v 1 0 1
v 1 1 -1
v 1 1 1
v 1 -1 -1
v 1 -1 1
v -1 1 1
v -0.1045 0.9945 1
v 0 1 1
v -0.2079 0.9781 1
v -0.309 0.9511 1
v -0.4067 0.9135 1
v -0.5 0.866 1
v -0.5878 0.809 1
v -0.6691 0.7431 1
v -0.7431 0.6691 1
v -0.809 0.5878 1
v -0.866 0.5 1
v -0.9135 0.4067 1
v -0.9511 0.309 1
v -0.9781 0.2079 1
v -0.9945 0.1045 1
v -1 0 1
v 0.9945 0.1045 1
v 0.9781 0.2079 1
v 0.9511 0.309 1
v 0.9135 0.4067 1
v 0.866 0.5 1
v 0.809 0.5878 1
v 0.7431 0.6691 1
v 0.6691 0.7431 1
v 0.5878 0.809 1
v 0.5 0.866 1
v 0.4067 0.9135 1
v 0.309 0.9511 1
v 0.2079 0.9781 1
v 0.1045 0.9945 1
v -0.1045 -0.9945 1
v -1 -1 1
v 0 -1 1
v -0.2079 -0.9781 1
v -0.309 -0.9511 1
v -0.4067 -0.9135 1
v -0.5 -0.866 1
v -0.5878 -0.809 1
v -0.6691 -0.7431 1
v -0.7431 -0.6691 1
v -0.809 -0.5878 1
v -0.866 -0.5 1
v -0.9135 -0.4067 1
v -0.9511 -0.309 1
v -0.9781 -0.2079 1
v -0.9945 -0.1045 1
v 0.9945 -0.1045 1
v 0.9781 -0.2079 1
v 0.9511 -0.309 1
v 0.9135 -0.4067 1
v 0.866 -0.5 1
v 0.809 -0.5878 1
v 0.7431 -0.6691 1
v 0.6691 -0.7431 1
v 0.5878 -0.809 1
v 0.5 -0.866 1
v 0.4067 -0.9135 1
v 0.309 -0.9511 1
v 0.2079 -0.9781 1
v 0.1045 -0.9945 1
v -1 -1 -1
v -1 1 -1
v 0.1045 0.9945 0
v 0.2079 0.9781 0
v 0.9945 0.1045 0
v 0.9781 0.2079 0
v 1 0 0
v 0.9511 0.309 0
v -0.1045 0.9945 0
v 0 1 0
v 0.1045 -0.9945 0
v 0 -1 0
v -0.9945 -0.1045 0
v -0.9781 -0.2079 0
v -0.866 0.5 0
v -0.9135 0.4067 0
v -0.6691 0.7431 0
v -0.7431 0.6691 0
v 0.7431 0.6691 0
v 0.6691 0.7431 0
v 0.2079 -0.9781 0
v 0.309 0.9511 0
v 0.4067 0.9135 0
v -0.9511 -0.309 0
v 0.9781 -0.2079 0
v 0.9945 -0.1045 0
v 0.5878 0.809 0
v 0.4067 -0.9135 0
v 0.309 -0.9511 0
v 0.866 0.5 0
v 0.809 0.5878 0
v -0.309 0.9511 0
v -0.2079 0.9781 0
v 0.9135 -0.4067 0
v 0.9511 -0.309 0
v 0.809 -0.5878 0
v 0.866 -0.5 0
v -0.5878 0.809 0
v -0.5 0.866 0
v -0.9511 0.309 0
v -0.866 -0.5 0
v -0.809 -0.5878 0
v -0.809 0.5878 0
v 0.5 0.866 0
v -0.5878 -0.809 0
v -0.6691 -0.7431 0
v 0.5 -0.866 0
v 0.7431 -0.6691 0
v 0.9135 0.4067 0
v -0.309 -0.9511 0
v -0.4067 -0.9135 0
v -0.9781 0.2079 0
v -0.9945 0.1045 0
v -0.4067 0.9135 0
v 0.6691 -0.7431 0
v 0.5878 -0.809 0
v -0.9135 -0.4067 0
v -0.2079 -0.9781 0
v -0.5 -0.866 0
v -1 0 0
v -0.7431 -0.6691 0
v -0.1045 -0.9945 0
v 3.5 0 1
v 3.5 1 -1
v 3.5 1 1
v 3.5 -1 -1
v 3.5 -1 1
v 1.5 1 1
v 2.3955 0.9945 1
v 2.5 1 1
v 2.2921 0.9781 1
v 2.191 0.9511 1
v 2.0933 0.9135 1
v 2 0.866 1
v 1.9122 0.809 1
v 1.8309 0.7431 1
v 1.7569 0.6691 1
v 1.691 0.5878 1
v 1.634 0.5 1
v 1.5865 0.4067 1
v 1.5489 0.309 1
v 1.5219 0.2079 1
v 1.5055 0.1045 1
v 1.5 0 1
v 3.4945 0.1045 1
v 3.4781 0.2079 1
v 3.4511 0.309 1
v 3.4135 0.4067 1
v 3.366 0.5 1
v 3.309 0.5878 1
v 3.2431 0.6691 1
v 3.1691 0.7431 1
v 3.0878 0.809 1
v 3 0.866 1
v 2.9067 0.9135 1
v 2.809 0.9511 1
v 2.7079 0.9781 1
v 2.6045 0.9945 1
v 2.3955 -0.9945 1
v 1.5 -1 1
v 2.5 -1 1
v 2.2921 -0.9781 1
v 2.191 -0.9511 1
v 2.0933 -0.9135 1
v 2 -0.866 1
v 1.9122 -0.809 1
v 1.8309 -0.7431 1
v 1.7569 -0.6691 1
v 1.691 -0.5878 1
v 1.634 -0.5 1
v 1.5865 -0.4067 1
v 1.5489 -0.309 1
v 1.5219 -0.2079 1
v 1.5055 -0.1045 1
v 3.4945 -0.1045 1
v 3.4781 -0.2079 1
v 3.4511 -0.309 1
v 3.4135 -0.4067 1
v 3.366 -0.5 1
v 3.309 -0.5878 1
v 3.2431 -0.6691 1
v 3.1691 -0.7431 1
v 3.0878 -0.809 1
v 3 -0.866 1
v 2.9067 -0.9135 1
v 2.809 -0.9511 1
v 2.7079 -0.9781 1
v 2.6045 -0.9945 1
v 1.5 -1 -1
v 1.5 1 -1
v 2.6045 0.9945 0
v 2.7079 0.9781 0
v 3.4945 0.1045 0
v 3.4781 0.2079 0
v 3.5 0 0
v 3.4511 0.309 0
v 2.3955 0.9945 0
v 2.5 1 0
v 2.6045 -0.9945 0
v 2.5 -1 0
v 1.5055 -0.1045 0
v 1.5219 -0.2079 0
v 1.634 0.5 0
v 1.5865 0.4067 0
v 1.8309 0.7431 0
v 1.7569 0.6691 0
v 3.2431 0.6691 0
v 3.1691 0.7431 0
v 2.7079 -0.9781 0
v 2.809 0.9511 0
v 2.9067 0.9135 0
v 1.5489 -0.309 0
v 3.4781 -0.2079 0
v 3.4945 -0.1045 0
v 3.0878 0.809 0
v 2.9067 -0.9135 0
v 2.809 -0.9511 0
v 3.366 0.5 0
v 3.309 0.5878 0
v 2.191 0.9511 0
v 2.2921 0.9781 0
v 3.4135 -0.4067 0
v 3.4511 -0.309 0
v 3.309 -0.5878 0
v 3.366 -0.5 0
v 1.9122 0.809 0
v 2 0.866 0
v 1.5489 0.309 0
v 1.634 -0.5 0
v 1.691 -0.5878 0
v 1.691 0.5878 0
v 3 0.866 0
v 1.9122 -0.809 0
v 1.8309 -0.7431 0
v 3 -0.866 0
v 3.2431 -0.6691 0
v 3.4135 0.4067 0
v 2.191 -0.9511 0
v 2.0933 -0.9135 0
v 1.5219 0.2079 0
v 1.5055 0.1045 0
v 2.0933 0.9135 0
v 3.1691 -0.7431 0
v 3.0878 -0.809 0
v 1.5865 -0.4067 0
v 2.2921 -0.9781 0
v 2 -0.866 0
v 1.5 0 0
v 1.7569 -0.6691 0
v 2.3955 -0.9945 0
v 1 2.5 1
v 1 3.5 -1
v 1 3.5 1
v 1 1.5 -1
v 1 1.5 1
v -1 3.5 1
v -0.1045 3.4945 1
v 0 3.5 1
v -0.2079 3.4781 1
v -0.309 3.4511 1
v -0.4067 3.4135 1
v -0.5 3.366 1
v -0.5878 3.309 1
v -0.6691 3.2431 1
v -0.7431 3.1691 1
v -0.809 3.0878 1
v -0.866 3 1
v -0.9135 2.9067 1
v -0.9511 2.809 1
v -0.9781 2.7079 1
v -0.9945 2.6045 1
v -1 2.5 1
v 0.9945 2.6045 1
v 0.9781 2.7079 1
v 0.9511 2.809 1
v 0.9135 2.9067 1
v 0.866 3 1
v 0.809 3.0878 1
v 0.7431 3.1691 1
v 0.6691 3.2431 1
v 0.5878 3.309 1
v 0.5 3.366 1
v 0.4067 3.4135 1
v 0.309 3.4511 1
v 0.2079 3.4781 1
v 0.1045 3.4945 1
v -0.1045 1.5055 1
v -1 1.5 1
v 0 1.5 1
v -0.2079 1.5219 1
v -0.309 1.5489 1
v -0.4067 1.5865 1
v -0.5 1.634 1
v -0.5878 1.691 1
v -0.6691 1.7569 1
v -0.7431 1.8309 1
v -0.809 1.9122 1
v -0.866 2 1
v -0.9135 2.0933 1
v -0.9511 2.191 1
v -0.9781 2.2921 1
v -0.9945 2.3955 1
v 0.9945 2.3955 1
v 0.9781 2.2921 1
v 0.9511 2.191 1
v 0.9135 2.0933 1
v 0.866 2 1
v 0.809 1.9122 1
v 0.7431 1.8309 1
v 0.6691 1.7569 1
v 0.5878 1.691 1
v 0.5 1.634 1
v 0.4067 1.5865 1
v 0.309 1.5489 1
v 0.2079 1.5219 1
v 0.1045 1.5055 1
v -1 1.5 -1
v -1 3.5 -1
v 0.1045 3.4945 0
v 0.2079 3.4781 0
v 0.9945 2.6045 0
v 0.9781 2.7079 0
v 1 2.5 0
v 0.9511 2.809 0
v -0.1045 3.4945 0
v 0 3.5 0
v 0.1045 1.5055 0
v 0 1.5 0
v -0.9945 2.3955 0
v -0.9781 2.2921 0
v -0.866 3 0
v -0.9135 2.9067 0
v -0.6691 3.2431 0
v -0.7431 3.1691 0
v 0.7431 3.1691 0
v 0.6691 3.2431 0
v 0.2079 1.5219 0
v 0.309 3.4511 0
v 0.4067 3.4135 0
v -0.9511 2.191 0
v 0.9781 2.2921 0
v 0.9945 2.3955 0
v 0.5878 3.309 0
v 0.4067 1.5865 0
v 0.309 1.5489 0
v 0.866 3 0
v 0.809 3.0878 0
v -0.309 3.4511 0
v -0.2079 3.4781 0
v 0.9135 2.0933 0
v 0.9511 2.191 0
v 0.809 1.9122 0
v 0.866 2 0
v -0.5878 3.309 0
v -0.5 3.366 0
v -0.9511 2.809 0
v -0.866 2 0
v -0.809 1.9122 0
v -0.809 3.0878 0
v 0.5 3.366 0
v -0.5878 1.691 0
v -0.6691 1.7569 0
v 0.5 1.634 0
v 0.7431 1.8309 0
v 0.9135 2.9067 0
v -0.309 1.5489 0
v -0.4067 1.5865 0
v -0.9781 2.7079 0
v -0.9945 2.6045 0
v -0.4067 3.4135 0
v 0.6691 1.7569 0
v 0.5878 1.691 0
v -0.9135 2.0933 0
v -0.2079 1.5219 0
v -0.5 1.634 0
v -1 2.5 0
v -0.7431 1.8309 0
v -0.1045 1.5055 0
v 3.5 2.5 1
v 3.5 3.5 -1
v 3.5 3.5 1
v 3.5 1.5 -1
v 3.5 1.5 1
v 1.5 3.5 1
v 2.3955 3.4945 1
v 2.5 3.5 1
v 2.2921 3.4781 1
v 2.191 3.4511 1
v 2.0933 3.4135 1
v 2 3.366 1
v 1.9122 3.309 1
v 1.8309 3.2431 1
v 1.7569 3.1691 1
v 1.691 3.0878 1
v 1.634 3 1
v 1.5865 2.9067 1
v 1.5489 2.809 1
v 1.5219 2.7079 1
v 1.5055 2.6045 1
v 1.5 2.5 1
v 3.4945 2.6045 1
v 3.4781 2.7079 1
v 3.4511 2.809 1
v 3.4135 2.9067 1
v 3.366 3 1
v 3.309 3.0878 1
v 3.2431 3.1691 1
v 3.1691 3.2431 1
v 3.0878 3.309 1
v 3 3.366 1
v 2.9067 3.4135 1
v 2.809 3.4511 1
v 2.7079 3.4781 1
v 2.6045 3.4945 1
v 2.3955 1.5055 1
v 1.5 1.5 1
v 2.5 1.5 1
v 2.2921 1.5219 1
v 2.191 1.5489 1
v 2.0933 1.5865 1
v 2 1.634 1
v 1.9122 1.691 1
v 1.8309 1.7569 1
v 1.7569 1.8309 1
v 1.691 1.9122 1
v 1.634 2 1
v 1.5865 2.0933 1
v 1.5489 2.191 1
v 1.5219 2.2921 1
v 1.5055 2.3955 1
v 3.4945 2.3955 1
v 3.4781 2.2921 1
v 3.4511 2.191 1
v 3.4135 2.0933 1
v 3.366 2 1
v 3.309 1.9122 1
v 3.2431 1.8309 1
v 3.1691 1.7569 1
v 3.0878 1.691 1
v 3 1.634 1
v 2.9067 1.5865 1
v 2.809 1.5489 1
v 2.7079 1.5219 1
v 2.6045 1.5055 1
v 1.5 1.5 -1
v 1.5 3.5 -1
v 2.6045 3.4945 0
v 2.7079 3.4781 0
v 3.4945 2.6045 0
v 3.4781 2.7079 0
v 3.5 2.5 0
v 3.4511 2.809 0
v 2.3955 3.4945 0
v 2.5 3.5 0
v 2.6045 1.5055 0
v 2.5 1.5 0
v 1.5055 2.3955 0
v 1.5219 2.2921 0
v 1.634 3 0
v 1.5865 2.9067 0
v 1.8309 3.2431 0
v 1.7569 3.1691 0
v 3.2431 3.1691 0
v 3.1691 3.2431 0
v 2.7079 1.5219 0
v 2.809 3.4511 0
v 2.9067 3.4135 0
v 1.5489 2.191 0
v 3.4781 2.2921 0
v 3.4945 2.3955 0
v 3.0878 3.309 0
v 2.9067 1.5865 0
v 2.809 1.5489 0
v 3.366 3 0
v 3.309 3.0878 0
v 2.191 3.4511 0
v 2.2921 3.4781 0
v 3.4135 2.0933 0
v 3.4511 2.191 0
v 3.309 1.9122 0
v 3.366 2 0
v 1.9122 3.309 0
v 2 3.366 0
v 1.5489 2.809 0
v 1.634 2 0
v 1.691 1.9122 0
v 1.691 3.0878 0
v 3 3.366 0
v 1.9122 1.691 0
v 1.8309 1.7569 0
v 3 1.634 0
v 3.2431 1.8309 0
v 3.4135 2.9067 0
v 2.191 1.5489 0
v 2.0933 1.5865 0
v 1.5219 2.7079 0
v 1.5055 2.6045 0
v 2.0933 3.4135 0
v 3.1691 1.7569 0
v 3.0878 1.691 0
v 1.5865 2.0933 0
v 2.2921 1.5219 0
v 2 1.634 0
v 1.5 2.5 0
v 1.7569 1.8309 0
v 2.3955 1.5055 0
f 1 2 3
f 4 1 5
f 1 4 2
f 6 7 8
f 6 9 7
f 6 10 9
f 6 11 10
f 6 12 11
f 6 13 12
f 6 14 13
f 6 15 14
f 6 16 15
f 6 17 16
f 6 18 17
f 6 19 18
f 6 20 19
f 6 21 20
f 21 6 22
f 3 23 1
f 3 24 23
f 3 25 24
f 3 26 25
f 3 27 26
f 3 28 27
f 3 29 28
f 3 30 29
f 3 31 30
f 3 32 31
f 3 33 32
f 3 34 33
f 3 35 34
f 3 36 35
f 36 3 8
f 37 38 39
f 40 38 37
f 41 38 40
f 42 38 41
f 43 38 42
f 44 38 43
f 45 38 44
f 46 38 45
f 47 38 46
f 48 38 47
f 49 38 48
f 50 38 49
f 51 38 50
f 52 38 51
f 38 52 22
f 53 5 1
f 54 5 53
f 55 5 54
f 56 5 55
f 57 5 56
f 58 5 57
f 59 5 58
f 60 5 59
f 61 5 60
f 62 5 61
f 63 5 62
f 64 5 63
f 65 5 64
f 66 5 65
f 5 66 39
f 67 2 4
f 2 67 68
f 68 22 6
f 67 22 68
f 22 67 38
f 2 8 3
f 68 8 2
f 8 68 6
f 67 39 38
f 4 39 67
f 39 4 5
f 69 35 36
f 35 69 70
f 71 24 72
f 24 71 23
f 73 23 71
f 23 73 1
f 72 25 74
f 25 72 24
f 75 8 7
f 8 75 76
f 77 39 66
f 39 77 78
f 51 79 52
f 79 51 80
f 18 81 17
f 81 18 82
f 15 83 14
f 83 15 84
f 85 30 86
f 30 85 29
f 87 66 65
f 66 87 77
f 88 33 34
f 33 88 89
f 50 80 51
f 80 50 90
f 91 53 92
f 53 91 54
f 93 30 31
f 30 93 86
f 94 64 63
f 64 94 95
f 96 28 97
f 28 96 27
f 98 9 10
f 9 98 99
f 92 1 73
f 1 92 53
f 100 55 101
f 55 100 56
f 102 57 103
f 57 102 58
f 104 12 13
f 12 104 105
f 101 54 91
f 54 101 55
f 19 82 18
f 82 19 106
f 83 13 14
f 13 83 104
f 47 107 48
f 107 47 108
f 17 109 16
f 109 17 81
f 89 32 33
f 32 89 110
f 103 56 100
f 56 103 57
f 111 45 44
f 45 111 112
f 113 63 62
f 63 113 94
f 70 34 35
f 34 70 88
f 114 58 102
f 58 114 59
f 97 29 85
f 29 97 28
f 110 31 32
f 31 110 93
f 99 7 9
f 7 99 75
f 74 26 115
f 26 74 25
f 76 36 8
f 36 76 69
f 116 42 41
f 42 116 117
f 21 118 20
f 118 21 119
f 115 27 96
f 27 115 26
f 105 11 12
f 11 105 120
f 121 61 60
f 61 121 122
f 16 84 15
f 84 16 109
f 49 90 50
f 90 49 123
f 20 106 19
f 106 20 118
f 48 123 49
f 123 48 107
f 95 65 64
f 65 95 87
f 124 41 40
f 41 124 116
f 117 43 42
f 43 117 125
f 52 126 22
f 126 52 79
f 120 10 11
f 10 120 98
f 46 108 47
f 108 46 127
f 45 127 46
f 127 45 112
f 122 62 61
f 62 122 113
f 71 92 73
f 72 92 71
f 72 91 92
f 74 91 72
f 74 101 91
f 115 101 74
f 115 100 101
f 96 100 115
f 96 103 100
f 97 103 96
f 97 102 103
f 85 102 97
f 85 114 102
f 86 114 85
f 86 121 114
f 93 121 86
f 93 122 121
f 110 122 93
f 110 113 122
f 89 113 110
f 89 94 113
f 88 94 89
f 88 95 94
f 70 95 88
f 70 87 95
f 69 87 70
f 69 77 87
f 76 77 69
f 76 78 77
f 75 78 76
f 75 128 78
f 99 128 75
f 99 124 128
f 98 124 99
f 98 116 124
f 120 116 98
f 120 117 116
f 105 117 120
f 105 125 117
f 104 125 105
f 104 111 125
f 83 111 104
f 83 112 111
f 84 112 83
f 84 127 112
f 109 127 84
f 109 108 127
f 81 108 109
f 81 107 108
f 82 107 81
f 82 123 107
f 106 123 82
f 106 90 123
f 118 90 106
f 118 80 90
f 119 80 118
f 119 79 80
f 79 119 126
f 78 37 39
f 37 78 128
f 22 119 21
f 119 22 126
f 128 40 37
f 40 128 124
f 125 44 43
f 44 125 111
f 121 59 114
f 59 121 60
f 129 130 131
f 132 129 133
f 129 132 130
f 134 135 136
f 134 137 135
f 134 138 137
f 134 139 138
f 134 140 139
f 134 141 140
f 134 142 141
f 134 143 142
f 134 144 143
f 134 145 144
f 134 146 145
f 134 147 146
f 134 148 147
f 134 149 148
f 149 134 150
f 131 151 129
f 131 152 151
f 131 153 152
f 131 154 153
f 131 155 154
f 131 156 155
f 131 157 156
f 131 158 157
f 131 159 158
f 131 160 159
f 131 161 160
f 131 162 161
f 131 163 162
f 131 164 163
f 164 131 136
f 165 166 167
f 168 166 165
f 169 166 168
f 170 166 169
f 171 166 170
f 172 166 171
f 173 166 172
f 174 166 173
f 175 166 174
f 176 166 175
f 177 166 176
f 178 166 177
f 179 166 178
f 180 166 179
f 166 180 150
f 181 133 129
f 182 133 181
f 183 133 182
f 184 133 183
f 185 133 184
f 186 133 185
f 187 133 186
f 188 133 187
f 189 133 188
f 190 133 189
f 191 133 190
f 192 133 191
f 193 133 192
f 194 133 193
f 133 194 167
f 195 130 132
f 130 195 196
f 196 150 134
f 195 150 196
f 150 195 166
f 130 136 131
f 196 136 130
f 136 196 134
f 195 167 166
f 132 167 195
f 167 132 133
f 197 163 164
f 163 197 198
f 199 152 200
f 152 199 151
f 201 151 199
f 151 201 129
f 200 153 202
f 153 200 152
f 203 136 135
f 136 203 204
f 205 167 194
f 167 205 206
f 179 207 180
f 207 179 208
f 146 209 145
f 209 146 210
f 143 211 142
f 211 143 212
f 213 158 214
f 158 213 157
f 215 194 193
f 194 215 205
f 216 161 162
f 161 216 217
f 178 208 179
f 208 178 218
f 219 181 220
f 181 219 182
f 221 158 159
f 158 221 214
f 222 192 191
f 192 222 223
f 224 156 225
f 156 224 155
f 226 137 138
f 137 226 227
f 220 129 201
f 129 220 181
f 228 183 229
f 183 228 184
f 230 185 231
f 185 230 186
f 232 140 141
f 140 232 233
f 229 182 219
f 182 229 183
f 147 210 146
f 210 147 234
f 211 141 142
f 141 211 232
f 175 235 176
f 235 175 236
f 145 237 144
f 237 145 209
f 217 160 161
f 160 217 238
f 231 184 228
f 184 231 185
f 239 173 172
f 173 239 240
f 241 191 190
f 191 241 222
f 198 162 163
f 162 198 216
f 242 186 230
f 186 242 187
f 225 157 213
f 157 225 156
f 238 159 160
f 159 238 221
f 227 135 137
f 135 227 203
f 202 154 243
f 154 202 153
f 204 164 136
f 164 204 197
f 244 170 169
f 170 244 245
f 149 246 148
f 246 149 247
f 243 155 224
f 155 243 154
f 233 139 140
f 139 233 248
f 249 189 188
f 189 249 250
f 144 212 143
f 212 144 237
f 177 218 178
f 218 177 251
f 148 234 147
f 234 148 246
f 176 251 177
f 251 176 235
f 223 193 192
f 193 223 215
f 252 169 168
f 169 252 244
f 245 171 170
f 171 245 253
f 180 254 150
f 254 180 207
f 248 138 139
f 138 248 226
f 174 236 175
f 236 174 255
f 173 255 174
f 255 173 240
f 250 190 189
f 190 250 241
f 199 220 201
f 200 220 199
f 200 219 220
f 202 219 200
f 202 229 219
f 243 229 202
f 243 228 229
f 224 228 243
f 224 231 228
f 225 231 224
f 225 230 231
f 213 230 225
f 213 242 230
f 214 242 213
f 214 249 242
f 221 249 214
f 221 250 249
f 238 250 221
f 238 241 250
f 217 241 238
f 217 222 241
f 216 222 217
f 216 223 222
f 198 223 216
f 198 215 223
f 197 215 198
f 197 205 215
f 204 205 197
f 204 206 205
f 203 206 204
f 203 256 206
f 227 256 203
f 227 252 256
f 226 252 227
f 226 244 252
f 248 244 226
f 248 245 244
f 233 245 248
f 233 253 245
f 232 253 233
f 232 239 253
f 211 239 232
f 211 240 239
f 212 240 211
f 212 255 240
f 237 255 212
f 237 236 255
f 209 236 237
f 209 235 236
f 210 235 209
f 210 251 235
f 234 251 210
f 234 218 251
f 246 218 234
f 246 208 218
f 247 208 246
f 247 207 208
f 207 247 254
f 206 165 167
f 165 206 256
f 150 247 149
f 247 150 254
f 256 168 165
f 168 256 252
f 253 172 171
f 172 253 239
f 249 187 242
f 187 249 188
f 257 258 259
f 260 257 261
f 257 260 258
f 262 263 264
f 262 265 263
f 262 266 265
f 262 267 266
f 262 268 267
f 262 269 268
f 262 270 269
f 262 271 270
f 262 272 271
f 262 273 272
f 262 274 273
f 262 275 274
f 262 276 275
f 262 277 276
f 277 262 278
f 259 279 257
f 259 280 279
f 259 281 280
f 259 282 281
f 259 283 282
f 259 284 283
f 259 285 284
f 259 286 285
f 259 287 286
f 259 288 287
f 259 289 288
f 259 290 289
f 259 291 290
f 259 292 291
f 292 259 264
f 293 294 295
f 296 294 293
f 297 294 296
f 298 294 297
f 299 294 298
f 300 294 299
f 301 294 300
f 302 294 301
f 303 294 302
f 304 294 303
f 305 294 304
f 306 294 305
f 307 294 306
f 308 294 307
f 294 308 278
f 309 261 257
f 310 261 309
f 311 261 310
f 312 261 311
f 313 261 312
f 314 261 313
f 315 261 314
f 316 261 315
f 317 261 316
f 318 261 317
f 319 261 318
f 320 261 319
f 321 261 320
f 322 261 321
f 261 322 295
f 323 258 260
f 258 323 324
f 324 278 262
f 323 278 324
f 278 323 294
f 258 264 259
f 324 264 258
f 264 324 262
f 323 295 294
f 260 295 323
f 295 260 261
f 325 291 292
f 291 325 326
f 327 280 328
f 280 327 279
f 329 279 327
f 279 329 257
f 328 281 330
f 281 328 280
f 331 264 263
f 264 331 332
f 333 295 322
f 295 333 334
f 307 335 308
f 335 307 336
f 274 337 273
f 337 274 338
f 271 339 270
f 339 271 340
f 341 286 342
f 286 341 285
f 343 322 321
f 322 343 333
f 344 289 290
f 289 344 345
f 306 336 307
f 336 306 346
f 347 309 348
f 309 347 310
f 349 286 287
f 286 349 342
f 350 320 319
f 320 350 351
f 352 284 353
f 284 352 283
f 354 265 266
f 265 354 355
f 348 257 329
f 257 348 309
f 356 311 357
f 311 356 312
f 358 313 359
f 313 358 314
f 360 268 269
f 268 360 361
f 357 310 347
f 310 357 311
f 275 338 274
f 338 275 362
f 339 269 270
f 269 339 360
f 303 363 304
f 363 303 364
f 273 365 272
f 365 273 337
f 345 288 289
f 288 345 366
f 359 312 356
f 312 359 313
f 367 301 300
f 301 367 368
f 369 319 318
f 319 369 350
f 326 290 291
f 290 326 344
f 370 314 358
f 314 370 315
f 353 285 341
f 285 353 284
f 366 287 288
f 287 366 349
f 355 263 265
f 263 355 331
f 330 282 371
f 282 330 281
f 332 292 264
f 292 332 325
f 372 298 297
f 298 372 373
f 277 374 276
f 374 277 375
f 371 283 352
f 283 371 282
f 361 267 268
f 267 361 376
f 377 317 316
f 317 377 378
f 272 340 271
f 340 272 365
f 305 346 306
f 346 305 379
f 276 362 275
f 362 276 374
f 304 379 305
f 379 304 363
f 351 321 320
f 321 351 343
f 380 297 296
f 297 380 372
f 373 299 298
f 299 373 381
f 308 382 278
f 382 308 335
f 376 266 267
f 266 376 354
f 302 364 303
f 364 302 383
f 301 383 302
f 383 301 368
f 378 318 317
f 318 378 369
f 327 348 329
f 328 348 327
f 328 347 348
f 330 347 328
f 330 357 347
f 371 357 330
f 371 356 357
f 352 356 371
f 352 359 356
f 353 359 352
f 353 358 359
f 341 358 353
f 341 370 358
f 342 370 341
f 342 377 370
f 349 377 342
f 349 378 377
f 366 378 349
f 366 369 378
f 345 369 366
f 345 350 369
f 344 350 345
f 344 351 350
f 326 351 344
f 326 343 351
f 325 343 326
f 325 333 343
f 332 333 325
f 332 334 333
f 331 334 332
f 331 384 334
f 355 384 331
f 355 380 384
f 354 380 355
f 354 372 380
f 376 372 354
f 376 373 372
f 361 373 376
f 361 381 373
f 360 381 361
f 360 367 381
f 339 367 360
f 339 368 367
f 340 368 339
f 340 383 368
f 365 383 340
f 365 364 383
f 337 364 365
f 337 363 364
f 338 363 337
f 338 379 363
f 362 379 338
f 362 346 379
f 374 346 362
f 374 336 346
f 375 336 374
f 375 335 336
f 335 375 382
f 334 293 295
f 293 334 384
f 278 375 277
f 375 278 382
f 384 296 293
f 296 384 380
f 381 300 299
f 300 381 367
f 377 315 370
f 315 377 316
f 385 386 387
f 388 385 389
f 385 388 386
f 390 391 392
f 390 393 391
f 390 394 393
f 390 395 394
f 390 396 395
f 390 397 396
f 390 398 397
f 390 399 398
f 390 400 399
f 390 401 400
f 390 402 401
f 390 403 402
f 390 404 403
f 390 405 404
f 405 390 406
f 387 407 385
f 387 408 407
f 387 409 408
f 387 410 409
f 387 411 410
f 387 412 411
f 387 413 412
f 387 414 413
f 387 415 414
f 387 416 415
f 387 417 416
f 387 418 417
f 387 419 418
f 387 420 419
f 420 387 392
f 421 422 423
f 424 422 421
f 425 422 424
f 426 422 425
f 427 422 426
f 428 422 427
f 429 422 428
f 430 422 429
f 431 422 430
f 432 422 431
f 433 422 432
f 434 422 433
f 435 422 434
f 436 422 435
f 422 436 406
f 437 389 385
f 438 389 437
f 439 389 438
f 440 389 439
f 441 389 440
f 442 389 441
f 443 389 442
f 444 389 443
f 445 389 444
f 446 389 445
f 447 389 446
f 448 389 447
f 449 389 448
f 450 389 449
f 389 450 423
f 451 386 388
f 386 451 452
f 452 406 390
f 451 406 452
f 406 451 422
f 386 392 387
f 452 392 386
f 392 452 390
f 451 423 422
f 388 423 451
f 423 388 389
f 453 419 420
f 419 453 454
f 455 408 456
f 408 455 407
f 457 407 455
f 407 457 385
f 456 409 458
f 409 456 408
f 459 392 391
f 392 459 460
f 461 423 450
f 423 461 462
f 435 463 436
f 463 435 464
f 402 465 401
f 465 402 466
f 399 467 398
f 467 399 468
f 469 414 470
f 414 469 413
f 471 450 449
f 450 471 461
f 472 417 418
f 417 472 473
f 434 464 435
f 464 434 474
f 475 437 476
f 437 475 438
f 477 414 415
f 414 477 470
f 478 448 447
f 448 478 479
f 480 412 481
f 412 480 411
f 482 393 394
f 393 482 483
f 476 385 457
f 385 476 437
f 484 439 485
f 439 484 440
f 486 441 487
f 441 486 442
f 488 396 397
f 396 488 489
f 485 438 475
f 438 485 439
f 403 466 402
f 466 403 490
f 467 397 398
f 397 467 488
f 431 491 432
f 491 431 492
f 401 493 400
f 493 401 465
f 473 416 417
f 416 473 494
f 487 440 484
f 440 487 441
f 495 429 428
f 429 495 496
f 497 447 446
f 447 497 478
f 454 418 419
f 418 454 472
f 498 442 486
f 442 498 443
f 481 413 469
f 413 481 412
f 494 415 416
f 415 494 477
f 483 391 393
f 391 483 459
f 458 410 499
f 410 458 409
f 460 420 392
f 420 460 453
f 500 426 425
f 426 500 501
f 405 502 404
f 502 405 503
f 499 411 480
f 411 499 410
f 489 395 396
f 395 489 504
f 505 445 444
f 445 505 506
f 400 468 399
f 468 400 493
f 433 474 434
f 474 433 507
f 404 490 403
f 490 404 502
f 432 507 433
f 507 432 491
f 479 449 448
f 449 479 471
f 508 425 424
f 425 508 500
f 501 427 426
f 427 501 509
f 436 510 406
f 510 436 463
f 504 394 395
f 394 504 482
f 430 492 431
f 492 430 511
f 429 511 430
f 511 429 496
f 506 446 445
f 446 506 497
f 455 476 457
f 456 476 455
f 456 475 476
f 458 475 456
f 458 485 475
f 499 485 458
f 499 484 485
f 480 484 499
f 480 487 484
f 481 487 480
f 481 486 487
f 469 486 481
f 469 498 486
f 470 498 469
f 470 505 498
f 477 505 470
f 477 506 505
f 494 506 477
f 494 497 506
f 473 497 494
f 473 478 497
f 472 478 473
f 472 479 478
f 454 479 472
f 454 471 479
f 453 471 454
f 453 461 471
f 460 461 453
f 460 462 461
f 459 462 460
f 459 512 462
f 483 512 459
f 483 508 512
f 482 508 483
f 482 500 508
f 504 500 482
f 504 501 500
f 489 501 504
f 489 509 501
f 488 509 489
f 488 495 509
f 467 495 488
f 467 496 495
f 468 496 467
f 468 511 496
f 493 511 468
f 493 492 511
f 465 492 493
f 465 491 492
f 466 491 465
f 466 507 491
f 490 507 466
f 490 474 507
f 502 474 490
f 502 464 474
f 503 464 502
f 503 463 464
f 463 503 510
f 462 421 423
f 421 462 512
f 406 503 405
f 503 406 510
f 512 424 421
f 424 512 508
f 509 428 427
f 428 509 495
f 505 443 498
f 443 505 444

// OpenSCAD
// file: math.scad
///< Math scad module


///< Find the hypotenuse from two sides of a right triangle
function hyp_from_sides( a, b ) = sqrt( pow( a, 2 ) + pow( b, 2 ) );

///< Find equal sides from hypotenuse of a right triangle
function sides_from_hyp(h) = sqrt( pow( h, 2 ) / 2 );

///< Find A from hypotenuse and B
function a_from_hb( h, b ) = sqrt( pow( h, 2 ) - pow( b, 2 ) );

function dist_2d( pt2, pt1 ) = sqrt(pow(( pt2[0]-pt1[0] ),2) + pow(( pt2[1]-pt1[1]),2) );

function mid_pt_2d( pt2, pt1 ) = [( pt1[0]+pt2[0] )/2, ( pt1[1]+pt2[1] )/2, 0 ];
///< Test for math functions

A = 3;
B = 4;
echo("Given A=", A, "and B=", B );
H = hyp_from_sides( A, B );
echo("Hypotenuse=", H );
echo("Calc Correct = ", (H == 5) );

echo("Given H=", H, " which is a hypotenuse with equal sides" );
echo( "the sides=", sides_from_hyp( H ) );

echo("Given H=", H, "B=", 4 );
echo("A=", a_from_hb( H, 4 ) );

echo("Distance from [-1,1] and [3,4] = ", dist_2d( [-1,1],[3,4]) );
// main file
//< Tile again, the interface is improved for more options
//< row: number of rows
//< col: number of columns
//< cw : cubed width, space between child objects tiled
//< pack: use offset packing
//< rot : angle of rotation for child objects
//< xpad: x axis padding
//< ypad: y axis padding

use <math.scad>

module tile( row, col, cw, pack=false, rot=0, xpad=0, ypad=0 ){
     x_shift = pack ? 1 : 0;
     y_shift = a_from_hb( cw, cw/2 );
     ystep   = pack ? y_shift : cw;
     for ( i = [0:row-1] ){
	  for( j = [0:col-1] ){
	       translate( [ j * (cw + xpad) + ( x_shift * (i%2) * cw/2), i * ( ystep + ypad), 0 ] )
		    rotate([0,0,rot])
		    children();
	  }
     }
}

width = 2;
tile(2,2,width+0.5) {
     difference() {
	     cube(width,true);
	 cylinder(h=width, d = width, $fn = 60);
     }
}
